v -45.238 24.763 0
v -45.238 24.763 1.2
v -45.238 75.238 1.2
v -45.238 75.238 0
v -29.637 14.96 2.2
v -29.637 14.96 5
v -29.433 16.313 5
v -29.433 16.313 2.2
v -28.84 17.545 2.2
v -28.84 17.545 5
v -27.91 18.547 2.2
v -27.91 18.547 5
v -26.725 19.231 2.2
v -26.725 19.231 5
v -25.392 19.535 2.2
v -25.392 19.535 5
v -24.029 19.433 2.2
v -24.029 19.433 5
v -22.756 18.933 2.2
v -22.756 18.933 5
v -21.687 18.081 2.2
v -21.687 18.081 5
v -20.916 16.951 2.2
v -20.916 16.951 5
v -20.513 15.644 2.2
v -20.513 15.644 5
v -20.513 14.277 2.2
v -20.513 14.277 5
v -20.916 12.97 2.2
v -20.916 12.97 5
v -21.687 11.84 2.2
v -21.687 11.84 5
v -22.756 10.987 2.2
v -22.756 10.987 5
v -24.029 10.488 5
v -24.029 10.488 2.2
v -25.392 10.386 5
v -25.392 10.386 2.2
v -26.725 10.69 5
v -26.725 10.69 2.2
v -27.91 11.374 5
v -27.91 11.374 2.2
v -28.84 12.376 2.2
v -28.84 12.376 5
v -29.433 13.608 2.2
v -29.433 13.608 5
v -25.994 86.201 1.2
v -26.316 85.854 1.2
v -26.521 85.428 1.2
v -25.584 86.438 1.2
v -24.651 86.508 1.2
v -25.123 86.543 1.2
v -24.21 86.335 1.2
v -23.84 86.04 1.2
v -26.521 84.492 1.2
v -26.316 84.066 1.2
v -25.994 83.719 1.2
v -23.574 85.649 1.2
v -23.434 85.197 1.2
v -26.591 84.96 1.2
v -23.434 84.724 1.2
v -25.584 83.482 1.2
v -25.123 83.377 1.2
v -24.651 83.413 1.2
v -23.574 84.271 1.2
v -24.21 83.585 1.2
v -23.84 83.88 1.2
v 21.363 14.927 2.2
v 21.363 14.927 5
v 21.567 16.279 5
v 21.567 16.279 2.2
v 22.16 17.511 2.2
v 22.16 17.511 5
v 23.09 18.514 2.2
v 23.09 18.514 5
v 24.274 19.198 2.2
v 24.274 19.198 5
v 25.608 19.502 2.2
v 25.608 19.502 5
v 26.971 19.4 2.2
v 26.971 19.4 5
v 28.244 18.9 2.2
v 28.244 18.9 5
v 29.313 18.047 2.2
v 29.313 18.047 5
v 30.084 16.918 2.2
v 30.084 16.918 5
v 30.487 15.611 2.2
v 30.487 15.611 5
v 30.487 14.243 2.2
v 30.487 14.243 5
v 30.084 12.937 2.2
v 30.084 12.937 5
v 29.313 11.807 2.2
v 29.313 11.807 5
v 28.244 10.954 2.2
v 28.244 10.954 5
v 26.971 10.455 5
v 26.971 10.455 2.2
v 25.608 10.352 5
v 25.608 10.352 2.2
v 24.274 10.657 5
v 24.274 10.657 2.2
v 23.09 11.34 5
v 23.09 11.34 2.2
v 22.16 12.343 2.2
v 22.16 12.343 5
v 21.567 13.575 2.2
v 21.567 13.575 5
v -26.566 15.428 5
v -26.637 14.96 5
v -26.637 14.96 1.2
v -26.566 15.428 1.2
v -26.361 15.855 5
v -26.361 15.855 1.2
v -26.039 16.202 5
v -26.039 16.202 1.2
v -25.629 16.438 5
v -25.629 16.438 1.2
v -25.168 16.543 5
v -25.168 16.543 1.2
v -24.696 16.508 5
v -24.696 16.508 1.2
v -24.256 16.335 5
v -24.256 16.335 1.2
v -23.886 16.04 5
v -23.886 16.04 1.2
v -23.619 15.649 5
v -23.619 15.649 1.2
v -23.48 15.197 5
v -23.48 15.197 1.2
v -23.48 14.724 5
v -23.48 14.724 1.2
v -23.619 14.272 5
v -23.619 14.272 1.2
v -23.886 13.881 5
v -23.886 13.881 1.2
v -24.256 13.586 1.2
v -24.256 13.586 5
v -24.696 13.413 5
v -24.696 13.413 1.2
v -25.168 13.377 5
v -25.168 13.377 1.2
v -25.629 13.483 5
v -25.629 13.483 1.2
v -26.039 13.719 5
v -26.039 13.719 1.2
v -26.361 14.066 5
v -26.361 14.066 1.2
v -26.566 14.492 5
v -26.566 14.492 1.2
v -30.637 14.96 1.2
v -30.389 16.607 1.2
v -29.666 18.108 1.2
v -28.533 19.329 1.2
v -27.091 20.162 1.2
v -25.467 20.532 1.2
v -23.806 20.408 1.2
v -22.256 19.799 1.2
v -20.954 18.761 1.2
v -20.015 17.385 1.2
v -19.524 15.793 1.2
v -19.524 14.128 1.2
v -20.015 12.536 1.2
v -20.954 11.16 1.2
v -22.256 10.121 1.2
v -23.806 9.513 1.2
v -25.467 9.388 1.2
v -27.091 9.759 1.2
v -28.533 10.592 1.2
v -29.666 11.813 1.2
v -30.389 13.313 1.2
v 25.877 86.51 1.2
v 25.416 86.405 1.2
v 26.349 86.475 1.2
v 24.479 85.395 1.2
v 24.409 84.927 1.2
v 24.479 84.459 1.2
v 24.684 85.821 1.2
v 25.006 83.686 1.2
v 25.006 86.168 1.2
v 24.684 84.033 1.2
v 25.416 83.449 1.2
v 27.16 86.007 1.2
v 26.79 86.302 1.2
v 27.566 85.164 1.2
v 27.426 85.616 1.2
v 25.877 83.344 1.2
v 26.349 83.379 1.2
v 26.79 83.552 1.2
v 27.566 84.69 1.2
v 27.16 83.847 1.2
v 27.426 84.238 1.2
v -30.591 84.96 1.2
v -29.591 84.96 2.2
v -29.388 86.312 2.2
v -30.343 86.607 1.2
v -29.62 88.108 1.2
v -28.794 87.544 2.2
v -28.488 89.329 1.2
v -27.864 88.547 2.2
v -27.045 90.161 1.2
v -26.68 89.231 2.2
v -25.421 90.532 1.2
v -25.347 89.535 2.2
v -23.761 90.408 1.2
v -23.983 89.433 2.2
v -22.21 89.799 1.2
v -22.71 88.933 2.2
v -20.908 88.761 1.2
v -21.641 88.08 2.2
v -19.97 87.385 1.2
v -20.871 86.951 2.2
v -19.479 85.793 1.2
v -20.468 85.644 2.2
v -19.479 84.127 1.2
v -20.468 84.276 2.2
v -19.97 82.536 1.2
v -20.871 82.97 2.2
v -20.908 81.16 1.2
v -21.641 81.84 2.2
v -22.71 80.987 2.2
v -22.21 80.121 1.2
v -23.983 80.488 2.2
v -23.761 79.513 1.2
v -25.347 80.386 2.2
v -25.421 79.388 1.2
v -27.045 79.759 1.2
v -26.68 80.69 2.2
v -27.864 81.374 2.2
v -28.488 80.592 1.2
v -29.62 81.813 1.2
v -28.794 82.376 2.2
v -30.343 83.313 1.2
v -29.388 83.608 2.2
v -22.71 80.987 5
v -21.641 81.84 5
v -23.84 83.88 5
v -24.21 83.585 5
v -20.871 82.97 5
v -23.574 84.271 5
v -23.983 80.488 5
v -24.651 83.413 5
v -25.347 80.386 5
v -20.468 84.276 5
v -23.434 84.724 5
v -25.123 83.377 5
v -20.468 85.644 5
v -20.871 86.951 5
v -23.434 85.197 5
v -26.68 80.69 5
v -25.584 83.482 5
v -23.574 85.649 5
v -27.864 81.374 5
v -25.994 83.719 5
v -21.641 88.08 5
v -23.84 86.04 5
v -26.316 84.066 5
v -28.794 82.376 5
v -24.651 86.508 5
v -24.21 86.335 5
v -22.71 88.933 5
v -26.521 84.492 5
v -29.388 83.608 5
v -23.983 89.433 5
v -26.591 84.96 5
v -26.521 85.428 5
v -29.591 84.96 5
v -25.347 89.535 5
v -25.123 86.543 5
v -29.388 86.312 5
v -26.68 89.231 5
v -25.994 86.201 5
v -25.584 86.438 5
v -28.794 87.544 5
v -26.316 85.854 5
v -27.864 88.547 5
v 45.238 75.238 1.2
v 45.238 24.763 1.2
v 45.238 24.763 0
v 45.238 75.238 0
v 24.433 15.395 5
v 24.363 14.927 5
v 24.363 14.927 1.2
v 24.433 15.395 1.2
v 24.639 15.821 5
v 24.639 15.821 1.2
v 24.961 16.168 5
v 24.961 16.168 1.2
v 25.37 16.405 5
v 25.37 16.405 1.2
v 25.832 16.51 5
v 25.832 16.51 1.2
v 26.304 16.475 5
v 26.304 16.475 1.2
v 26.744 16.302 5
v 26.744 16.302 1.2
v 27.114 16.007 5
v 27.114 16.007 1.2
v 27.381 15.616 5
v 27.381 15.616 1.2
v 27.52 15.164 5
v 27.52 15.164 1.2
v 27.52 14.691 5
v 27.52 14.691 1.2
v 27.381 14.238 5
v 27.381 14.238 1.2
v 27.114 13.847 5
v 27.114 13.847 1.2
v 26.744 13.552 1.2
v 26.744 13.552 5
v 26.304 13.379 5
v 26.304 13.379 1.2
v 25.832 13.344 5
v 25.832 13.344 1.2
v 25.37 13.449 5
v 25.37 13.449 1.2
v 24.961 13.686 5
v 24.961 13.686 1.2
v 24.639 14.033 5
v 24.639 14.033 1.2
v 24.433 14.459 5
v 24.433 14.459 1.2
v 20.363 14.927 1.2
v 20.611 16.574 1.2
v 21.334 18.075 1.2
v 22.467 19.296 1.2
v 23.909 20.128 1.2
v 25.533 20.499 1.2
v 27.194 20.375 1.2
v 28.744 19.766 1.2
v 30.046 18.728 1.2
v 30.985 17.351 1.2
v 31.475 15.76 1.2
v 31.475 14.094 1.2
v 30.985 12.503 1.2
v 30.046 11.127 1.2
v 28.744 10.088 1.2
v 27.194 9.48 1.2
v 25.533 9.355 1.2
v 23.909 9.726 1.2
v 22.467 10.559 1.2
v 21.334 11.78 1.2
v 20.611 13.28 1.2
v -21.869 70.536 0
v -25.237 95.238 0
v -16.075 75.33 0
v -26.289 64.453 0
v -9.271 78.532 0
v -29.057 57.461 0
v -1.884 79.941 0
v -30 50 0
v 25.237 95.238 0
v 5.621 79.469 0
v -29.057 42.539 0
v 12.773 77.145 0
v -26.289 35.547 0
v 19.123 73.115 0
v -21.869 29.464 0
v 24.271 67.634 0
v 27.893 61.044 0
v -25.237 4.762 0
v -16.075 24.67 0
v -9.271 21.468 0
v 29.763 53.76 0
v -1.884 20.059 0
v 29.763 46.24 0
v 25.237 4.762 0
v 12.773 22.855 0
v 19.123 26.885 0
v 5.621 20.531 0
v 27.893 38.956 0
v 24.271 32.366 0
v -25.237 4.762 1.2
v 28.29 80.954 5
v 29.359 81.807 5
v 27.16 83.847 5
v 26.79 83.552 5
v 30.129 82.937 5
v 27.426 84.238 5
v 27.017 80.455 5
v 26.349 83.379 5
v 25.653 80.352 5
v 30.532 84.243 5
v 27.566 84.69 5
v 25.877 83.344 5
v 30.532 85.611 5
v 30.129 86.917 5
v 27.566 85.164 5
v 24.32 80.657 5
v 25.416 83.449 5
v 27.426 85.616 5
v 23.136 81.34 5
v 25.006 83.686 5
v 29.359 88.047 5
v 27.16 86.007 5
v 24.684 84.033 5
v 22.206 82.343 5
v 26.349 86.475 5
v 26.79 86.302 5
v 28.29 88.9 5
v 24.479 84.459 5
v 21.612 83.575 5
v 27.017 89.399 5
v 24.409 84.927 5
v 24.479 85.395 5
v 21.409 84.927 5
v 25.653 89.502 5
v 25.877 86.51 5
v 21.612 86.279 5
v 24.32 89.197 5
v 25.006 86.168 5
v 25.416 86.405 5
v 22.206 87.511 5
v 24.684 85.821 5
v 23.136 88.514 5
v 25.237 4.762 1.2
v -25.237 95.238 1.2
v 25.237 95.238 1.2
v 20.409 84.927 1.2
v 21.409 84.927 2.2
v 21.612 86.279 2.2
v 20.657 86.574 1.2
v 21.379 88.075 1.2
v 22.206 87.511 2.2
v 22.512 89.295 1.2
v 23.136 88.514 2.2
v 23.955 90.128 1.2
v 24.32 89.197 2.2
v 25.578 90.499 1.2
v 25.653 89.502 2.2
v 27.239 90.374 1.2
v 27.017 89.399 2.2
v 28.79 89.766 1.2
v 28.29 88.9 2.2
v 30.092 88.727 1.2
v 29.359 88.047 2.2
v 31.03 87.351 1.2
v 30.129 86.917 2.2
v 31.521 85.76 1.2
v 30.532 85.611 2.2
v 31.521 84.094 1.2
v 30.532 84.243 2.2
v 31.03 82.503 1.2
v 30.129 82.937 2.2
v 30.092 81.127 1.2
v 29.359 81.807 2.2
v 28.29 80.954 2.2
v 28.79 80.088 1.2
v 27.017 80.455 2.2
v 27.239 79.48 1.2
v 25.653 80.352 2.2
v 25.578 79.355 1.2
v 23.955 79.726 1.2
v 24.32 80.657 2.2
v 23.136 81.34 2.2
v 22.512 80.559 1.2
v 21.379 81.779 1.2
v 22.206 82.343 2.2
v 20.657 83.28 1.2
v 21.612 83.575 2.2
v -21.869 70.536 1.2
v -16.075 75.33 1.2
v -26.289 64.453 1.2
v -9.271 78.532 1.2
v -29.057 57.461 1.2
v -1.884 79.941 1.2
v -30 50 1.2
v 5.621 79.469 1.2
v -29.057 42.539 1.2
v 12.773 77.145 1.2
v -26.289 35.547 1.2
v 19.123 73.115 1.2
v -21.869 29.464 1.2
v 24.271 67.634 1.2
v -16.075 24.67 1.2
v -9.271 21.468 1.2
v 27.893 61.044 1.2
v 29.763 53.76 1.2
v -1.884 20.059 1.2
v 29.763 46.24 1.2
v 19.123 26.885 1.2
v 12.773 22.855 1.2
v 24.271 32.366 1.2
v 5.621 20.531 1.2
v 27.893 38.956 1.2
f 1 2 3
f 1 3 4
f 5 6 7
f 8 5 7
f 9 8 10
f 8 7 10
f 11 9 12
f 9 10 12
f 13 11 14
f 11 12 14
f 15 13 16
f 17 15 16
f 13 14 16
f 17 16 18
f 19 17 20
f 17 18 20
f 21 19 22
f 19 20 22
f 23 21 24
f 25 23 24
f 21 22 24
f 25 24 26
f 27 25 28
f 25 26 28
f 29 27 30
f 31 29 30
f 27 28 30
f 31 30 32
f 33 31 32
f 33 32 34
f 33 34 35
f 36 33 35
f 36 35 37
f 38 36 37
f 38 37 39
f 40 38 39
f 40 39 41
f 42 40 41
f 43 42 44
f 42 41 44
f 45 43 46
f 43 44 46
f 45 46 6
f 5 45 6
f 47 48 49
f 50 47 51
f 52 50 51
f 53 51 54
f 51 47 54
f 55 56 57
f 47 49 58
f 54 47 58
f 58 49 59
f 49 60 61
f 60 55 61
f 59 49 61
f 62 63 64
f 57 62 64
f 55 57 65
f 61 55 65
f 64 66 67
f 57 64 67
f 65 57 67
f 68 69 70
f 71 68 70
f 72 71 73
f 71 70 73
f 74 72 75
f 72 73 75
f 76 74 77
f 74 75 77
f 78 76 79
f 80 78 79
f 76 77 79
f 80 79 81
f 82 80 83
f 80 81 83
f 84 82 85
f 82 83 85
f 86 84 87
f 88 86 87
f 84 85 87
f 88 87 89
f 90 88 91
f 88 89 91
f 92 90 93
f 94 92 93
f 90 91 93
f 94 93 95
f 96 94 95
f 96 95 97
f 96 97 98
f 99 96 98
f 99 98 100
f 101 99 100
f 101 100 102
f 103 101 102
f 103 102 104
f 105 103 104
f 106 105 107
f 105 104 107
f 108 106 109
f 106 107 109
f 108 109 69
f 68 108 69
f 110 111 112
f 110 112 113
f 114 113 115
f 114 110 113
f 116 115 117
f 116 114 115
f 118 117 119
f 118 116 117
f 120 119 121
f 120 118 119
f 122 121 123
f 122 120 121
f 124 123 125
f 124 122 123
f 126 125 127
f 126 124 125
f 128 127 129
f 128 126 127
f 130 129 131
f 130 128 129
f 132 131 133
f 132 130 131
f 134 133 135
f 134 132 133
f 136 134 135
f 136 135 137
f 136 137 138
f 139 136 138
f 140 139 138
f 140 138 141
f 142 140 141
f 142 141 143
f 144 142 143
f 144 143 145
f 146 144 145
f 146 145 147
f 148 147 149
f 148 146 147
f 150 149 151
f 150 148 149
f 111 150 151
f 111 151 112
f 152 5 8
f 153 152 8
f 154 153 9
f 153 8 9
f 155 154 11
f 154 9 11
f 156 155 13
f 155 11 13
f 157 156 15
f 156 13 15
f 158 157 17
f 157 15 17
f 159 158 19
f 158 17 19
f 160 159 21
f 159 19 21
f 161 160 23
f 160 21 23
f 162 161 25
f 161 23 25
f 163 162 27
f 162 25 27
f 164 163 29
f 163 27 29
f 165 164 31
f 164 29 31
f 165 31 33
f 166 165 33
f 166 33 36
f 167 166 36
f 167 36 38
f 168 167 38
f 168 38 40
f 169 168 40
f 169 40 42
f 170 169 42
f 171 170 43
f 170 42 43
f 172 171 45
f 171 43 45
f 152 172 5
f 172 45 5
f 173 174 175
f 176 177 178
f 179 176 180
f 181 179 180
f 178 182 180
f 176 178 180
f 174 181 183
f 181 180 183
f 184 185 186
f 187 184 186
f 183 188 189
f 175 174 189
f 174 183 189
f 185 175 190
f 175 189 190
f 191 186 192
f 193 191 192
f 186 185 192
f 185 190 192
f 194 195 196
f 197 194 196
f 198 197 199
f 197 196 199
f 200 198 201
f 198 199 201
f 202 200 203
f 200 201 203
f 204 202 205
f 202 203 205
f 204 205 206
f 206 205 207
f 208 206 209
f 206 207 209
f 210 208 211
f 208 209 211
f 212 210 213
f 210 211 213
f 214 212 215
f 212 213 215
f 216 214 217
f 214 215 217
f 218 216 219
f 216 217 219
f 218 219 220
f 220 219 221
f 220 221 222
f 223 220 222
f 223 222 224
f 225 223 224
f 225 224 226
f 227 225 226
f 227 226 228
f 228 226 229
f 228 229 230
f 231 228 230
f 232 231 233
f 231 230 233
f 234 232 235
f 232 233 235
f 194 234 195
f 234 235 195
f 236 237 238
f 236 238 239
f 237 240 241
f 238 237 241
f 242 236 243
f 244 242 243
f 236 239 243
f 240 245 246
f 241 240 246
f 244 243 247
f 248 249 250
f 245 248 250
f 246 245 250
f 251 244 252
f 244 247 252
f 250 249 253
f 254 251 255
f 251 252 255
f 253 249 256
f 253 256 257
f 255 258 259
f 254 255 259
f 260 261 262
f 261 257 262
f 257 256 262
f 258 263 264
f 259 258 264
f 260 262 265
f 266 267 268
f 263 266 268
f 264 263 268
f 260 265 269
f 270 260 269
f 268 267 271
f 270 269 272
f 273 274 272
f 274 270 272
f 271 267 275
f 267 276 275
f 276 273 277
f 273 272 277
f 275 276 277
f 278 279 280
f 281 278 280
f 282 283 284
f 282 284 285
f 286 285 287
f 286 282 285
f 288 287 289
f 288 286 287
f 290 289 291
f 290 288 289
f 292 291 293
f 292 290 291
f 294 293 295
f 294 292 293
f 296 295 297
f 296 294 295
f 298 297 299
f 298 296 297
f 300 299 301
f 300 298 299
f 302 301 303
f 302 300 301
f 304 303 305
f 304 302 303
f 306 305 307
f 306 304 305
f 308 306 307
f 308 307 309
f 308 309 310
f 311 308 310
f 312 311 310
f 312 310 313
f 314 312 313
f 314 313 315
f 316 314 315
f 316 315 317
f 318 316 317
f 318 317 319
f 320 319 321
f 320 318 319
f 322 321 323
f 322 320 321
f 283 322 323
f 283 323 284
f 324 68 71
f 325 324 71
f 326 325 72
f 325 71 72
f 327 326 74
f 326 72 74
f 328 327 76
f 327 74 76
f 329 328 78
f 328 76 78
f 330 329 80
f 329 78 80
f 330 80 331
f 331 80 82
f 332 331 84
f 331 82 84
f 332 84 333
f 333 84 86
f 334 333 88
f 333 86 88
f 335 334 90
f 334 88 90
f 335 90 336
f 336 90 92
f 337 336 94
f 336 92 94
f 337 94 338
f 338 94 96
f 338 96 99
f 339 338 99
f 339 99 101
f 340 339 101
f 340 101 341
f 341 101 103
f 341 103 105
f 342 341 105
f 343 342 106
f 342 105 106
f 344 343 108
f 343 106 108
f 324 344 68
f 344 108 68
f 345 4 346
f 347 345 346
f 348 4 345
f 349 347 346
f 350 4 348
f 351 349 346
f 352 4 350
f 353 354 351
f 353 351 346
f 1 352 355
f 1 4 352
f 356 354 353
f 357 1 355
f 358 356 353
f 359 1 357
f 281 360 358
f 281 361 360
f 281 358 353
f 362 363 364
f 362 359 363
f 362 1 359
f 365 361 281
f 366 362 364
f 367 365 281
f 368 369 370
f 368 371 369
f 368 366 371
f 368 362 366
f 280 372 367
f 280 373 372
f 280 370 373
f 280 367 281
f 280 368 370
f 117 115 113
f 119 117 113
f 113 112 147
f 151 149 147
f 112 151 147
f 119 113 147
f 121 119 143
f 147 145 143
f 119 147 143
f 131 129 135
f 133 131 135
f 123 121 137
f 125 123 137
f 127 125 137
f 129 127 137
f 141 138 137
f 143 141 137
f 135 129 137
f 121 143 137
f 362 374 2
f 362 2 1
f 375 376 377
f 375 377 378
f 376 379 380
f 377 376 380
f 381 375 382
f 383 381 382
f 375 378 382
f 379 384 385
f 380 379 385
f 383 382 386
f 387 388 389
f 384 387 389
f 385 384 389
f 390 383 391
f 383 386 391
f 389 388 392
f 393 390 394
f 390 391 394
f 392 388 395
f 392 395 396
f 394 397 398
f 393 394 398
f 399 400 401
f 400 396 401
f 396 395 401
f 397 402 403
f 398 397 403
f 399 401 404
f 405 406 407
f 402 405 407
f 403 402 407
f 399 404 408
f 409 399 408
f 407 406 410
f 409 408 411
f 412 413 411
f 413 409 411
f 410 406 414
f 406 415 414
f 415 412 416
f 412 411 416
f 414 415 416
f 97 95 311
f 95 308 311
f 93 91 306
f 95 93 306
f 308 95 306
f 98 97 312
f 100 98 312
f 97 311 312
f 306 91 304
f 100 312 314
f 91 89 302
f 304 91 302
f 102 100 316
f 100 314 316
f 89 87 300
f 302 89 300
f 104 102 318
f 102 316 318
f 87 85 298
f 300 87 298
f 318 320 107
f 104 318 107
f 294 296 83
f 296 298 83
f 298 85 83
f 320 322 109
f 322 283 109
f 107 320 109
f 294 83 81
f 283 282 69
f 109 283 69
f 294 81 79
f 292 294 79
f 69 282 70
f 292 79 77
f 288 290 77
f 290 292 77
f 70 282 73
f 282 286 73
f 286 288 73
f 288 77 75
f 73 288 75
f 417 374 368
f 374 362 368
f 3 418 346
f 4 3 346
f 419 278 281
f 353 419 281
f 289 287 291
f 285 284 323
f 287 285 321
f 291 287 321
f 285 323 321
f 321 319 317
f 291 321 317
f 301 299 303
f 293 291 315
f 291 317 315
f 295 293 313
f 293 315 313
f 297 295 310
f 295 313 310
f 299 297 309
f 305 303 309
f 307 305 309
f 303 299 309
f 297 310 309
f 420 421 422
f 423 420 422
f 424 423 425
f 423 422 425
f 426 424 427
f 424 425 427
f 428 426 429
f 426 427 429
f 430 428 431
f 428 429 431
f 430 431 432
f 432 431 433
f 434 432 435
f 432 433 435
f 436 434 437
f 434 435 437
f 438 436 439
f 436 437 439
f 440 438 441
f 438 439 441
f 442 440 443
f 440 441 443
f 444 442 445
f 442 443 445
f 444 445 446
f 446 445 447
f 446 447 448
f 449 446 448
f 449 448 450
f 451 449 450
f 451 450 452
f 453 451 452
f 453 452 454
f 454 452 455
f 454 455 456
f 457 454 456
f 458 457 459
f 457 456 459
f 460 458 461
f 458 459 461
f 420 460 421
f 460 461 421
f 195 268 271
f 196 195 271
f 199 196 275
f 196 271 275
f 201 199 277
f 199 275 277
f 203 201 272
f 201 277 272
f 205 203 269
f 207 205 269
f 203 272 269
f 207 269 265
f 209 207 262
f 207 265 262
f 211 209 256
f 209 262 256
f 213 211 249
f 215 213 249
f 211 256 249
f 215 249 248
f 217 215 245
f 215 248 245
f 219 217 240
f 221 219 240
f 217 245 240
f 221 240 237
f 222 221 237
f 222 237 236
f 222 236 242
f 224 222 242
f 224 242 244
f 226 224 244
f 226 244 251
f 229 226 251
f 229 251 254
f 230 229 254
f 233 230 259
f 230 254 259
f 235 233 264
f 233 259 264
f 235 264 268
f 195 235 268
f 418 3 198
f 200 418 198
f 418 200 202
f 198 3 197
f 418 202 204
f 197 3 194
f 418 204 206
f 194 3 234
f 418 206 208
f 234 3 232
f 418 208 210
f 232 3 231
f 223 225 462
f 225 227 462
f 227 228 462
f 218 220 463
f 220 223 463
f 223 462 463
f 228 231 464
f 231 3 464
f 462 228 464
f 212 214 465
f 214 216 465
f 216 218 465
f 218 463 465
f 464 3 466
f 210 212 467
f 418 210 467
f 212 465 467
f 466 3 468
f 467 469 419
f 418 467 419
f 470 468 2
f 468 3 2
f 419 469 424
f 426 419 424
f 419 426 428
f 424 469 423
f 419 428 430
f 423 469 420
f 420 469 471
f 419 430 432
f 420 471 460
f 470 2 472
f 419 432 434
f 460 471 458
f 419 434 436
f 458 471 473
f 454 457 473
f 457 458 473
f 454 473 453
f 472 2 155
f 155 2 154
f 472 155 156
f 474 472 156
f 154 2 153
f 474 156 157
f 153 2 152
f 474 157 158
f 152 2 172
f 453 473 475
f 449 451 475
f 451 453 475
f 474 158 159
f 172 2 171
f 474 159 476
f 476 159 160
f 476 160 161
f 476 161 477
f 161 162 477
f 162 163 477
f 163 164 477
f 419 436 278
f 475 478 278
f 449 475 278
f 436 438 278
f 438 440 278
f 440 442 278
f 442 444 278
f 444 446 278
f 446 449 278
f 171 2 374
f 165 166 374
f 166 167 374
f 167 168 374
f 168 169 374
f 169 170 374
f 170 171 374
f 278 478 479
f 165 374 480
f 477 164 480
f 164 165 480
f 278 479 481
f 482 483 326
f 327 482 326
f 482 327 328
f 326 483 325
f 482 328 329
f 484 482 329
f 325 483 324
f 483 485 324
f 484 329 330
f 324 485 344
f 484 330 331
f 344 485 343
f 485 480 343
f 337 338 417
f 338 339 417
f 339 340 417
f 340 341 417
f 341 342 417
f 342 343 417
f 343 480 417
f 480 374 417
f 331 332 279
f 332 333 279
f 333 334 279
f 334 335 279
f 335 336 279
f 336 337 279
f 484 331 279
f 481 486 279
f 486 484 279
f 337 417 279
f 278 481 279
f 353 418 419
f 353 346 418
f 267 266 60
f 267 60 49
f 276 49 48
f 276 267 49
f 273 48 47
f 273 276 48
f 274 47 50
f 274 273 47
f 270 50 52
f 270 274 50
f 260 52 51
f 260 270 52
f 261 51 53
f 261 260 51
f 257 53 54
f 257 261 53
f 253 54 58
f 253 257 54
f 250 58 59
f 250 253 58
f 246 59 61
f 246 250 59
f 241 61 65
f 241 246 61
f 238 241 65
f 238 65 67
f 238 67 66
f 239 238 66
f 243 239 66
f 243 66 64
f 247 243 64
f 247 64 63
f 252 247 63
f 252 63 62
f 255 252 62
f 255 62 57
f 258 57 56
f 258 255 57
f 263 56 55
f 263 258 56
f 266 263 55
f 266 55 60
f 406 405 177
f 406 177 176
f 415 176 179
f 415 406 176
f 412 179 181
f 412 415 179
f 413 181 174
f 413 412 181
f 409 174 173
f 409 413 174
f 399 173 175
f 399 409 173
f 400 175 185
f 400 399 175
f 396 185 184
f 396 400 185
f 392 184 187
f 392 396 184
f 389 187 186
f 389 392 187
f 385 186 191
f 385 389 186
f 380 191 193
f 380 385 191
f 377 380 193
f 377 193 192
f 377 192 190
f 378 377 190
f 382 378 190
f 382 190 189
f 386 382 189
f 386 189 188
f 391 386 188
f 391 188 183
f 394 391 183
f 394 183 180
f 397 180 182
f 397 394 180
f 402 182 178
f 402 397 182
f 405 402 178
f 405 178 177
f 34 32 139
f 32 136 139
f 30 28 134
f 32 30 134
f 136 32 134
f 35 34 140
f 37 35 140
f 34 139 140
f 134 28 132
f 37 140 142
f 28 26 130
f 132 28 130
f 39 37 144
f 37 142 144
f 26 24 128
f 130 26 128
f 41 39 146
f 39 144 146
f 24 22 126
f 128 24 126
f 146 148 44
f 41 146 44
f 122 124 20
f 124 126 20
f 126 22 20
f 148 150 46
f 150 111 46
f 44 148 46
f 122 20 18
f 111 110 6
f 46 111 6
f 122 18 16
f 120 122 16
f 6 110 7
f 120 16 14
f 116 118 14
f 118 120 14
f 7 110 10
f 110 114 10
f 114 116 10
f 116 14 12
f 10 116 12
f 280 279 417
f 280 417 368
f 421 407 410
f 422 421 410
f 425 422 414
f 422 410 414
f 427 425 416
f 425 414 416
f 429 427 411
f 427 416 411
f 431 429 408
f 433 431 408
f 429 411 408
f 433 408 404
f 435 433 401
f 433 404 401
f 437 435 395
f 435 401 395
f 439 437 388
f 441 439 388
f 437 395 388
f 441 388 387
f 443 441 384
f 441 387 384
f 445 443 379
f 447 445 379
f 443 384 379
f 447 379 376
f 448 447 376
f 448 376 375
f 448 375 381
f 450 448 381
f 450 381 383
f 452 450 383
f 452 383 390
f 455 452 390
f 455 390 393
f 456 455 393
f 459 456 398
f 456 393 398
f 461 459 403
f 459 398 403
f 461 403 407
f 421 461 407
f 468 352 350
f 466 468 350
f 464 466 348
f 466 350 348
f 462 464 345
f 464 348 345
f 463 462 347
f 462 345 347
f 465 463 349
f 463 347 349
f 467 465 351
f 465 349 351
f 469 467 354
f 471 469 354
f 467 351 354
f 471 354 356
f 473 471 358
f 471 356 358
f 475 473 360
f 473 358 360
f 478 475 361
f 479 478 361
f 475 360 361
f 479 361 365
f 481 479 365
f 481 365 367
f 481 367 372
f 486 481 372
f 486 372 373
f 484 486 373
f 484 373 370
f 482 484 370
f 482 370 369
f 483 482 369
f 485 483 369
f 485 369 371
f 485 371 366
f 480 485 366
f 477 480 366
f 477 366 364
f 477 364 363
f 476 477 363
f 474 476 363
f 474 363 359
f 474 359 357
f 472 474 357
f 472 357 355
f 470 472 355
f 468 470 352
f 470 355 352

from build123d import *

# Parameters (mm, degrees)
SKETCH2_W           = 90.475
SKETCH2_H           = 1.2
BOSS_EXTRUDE1_DEPTH = 90.475
SKETCH3_R           = 4.587496825
SKETCH3_R_2         = 1.587496825
EXTRUDE_THIN1_DEPTH = 3.8
CHAMFER1_SIZE       = 1
SKETCH5_R           = 30
CUT_EXTRUDE1_DEPTH  = 106.553838455
CHAMFER2_SIZE       = 20


with BuildPart() as part:
    # Sketch2 → Boss-Extrude1 (new body)
    with BuildSketch(Plane(origin=(0, 4.7625, 0), x_dir=(1, 0, 0), z_dir=(0, 1, 0))):
        with Locations((0, -0.6)):
            Rectangle(SKETCH2_W, SKETCH2_H)
    extrude(amount=BOSS_EXTRUDE1_DEPTH)

    # Sketch3 → Extrude-Thin1 (add)
    # profile 1 of 4: a face of its own
    with BuildSketch(Plane(origin=(0, 0, 5), x_dir=(-1, 0, 0), z_dir=(0, 0, -1))):
        with Locations((25.003889322, 84.960201446)):
            Circle(SKETCH3_R)
        with Locations((25.003889322, 84.960201446)):
            Circle(SKETCH3_R_2, mode=Mode.SUBTRACT)
    # profile 2 of 4: a face of its own
    with BuildSketch(Plane(origin=(0, 0, 5), x_dir=(-1, 0, 0), z_dir=(0, 0, -1))):
        with Locations((-25.995997859, 84.926982308)):
            Circle(SKETCH3_R)
        with Locations((-25.995997859, 84.926982308)):
            Circle(SKETCH3_R_2, mode=Mode.SUBTRACT)
    # profile 3 of 4: a face of its own
    with BuildSketch(Plane(origin=(0, 0, 5), x_dir=(-1, 0, 0), z_dir=(0, 0, -1))):
        with Locations((25.049484218, 14.960356296)):
            Circle(SKETCH3_R)
        with Locations((25.049484218, 14.960356296)):
            Circle(SKETCH3_R_2, mode=Mode.SUBTRACT)
    # profile 4 of 4: a face of its own
    with BuildSketch(Plane(origin=(0, 0, 5), x_dir=(-1, 0, 0), z_dir=(0, 0, -1))):
        with Locations((-25.950402964, 14.927137158)):
            Circle(SKETCH3_R)
        with Locations((-25.950402964, 14.927137158)):
            Circle(SKETCH3_R_2, mode=Mode.SUBTRACT)
    extrude(amount=EXTRUDE_THIN1_DEPTH)

    # Chamfer1
    chamfer1_edges = [part.edges().sort_by_distance(p)[0] for p in [
        (-20.416392497, 84.960201446, 1.2),
        (30.583494684, 84.926982308, 1.2),
        (-20.461987393, 14.960356296, 1.2),
        (30.537899789, 14.927137158, 1.2),
    ]]
    chamfer(chamfer1_edges, length=CHAMFER1_SIZE)

    # Sketch5 → Cut-Extrude1 (cut, through all)
    with BuildSketch(Plane(origin=(0, 0, 0), x_dir=(-1, 0, 0), z_dir=(0, 0, -1))):
        with Locations((0, 50)):
            Circle(SKETCH5_R)
    extrude(amount=-CUT_EXTRUDE1_DEPTH, mode=Mode.SUBTRACT)

    # Chamfer2
    chamfer2_edges = [part.edges().sort_by_distance(p)[0] for p in [
        (-45.2375, 95.2375, 0.6),
        (45.2375, 95.2375, 0.6),
        (-45.2375, 4.7625, 0.6),
        (45.2375, 4.7625, 0.6),
    ]]
    chamfer(chamfer2_edges, length=CHAMFER2_SIZE)


solid = part.part
